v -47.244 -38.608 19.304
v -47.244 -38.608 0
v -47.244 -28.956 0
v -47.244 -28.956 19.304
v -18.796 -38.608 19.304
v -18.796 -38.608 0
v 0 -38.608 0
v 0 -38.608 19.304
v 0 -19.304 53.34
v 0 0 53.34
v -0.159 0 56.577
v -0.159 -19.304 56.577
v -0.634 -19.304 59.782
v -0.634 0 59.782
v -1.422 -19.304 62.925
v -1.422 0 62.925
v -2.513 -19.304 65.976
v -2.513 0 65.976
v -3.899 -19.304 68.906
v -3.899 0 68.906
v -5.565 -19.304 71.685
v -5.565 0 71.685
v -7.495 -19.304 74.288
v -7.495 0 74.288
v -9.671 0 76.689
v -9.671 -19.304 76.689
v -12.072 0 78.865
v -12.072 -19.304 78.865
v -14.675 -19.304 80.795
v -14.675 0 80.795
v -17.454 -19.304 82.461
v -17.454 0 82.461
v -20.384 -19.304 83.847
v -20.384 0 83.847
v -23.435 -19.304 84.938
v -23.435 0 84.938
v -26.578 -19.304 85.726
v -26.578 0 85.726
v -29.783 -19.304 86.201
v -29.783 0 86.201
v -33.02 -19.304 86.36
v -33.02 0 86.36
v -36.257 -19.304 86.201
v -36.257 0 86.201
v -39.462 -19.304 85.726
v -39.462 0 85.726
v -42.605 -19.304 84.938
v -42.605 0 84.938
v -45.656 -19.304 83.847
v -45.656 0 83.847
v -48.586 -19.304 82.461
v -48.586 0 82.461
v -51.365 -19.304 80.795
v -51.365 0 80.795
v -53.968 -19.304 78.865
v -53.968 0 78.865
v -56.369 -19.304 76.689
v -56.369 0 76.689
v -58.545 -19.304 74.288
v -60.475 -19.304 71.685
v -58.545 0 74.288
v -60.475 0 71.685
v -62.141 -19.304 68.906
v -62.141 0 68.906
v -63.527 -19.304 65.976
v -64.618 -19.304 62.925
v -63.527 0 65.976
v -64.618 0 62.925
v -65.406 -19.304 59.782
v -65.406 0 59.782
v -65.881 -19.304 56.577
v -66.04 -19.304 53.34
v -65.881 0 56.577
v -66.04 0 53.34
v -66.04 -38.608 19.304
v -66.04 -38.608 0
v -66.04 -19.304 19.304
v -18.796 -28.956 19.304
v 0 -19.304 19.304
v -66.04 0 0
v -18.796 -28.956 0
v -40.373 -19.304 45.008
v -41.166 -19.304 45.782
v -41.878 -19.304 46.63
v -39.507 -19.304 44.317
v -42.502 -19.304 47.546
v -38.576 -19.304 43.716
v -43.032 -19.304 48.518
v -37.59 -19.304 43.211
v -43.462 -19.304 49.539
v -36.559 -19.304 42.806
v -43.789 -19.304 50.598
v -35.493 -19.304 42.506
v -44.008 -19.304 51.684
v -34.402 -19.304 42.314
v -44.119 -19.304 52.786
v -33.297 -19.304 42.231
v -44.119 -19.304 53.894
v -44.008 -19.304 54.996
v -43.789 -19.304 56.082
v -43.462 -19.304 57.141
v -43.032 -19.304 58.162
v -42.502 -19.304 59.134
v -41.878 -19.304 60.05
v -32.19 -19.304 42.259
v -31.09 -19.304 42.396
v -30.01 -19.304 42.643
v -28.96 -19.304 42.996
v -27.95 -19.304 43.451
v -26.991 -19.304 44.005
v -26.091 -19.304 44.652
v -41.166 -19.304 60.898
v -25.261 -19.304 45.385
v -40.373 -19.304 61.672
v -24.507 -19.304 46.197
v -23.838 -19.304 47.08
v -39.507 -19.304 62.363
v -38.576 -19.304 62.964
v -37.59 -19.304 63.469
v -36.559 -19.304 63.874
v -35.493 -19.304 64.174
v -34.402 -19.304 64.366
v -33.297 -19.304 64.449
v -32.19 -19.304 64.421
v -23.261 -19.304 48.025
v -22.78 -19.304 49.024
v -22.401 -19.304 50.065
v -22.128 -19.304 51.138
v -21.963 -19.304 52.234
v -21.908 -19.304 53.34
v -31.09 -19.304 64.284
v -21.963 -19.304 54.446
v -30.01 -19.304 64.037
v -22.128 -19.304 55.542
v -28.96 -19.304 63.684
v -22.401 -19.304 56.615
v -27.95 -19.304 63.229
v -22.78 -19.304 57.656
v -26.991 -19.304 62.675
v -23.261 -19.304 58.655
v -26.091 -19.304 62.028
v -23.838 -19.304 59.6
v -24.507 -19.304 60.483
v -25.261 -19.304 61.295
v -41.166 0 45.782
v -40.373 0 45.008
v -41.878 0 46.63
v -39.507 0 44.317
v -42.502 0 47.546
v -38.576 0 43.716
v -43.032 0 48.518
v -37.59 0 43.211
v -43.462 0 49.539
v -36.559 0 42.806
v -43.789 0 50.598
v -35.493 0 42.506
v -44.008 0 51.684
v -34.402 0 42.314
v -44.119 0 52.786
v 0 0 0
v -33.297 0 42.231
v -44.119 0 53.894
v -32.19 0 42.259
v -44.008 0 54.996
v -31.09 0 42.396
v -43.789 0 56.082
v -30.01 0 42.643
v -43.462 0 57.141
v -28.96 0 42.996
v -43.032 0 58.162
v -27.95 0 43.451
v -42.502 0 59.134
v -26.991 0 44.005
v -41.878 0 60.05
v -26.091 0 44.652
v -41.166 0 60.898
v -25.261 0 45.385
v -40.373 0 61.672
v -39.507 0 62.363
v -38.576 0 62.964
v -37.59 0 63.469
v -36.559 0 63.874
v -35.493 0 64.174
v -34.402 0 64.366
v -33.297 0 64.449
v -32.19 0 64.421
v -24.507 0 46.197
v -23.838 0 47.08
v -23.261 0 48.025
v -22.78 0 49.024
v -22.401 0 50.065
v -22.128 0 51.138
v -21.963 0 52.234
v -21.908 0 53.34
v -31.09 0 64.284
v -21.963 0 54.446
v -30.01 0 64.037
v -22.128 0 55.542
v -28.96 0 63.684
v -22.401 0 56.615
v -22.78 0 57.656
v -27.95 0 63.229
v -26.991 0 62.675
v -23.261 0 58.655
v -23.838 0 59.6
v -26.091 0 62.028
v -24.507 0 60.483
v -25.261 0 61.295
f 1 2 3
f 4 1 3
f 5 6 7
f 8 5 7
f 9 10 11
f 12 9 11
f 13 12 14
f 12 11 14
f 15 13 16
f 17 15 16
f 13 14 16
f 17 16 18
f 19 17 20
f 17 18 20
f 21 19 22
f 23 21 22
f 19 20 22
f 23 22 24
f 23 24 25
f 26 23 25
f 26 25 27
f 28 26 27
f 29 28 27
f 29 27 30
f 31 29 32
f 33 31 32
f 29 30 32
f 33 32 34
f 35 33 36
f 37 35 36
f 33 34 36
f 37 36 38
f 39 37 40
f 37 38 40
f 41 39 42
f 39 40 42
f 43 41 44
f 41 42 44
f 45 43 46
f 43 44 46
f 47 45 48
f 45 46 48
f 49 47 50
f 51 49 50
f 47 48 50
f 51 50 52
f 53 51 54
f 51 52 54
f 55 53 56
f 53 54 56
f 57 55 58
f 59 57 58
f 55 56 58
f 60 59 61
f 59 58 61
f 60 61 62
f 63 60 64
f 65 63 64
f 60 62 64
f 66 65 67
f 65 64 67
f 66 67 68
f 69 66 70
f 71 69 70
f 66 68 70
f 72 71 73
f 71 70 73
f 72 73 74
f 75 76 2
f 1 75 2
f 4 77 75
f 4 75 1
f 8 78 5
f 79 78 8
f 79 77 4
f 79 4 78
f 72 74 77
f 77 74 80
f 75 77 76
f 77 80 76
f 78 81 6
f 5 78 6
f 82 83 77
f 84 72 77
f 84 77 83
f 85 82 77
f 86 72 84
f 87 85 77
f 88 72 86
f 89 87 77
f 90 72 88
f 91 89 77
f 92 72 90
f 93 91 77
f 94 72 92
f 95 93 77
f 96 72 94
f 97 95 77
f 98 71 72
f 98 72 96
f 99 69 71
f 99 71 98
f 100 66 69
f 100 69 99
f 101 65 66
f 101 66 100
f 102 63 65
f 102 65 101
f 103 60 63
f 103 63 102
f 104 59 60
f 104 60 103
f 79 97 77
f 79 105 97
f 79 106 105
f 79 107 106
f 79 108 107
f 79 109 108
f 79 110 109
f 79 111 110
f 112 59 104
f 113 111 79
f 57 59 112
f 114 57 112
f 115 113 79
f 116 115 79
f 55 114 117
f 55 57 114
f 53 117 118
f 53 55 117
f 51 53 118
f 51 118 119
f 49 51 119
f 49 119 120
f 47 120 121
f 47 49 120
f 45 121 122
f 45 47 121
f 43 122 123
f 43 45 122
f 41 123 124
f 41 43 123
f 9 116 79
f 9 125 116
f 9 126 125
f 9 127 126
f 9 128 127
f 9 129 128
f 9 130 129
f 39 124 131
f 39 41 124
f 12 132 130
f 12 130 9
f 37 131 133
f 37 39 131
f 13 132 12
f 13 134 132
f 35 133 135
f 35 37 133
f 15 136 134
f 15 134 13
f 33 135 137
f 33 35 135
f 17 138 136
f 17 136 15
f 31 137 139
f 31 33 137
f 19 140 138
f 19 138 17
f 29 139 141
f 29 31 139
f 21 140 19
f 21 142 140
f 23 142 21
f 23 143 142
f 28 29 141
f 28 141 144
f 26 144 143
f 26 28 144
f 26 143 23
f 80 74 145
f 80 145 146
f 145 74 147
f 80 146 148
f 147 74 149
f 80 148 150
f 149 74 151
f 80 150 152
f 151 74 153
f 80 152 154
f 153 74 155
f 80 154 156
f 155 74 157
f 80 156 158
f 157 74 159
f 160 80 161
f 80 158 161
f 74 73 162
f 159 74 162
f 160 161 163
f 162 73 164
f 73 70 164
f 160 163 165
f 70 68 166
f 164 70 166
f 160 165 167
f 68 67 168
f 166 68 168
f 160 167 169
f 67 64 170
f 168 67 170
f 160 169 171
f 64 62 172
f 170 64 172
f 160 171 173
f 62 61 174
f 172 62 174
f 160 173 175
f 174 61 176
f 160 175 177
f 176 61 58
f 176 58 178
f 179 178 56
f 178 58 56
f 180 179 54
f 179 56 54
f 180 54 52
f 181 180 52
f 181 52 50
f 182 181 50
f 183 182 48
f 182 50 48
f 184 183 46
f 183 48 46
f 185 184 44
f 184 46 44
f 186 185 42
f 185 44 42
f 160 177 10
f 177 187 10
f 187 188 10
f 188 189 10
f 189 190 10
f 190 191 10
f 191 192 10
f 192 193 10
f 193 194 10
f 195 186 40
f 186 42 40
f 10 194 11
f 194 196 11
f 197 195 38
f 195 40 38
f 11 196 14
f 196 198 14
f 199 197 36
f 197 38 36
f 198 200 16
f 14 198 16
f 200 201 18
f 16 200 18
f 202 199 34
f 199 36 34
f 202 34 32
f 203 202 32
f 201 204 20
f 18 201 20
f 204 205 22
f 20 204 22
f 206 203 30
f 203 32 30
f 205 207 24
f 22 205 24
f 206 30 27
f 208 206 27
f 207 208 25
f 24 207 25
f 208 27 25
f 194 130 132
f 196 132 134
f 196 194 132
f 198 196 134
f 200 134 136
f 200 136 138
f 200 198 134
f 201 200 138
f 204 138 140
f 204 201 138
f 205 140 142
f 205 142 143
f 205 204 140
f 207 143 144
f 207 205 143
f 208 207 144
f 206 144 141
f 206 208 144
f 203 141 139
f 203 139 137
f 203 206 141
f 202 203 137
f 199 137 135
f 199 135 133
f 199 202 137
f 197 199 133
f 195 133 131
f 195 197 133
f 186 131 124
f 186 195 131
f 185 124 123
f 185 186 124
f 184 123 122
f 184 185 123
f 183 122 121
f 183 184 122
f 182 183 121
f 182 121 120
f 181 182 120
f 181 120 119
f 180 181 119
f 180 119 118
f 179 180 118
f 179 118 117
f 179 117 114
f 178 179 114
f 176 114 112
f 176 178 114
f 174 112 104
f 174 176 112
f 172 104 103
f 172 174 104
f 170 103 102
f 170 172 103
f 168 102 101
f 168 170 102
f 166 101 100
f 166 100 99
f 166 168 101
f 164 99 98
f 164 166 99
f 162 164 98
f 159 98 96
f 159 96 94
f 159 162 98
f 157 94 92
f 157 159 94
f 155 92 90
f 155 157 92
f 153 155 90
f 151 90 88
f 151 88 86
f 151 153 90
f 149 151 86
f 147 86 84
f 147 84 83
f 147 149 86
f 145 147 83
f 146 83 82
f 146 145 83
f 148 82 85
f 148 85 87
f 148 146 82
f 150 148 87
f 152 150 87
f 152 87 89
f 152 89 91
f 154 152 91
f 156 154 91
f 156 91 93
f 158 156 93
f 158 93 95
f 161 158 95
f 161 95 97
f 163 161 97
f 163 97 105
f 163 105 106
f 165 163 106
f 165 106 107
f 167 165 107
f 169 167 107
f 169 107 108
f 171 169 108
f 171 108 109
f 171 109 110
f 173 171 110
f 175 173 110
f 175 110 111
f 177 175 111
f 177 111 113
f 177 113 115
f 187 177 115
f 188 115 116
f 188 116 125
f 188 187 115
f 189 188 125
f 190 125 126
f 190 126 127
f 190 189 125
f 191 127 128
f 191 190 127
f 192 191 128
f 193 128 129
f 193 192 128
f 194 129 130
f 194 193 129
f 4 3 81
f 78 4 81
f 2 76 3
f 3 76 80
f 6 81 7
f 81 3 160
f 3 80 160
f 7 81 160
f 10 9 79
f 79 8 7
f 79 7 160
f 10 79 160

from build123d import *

# Parameters (mm, degrees)
F0_R     = 11.1125
F1_DEPTH = 19.304
F3_DEPTH = 19.304


with BuildPart() as f1:
    # F0 (on Front) → F1 (new body)
    with BuildSketch(Plane.XZ):
        with BuildLine():
            Line((-66.04, 0), (0, 0))
            Line((0, 0), (0, 53.34))
            ThreePointArc((0, 53.34), (-33.02, 86.36), (-66.04, 53.34))
            Line((-66.04, 53.34), (-66.04, 0))
        make_face()
        with Locations((-33.02, 53.34)):
            Circle(F0_R, mode=Mode.SUBTRACT)
    extrude(amount=F1_DEPTH)

    # F2 (on Top) → F3 (join)
    with BuildSketch(Plane.XY):
        Polygon((0, -38.608), (0, 0), (-66.04, 0), (-66.04, -38.608), (-47.244, -38.608), (-47.244, -28.956), (-18.796, -28.956), (-18.796, -38.608), align=None)
    extrude(amount=F3_DEPTH)


solid = f1.part
